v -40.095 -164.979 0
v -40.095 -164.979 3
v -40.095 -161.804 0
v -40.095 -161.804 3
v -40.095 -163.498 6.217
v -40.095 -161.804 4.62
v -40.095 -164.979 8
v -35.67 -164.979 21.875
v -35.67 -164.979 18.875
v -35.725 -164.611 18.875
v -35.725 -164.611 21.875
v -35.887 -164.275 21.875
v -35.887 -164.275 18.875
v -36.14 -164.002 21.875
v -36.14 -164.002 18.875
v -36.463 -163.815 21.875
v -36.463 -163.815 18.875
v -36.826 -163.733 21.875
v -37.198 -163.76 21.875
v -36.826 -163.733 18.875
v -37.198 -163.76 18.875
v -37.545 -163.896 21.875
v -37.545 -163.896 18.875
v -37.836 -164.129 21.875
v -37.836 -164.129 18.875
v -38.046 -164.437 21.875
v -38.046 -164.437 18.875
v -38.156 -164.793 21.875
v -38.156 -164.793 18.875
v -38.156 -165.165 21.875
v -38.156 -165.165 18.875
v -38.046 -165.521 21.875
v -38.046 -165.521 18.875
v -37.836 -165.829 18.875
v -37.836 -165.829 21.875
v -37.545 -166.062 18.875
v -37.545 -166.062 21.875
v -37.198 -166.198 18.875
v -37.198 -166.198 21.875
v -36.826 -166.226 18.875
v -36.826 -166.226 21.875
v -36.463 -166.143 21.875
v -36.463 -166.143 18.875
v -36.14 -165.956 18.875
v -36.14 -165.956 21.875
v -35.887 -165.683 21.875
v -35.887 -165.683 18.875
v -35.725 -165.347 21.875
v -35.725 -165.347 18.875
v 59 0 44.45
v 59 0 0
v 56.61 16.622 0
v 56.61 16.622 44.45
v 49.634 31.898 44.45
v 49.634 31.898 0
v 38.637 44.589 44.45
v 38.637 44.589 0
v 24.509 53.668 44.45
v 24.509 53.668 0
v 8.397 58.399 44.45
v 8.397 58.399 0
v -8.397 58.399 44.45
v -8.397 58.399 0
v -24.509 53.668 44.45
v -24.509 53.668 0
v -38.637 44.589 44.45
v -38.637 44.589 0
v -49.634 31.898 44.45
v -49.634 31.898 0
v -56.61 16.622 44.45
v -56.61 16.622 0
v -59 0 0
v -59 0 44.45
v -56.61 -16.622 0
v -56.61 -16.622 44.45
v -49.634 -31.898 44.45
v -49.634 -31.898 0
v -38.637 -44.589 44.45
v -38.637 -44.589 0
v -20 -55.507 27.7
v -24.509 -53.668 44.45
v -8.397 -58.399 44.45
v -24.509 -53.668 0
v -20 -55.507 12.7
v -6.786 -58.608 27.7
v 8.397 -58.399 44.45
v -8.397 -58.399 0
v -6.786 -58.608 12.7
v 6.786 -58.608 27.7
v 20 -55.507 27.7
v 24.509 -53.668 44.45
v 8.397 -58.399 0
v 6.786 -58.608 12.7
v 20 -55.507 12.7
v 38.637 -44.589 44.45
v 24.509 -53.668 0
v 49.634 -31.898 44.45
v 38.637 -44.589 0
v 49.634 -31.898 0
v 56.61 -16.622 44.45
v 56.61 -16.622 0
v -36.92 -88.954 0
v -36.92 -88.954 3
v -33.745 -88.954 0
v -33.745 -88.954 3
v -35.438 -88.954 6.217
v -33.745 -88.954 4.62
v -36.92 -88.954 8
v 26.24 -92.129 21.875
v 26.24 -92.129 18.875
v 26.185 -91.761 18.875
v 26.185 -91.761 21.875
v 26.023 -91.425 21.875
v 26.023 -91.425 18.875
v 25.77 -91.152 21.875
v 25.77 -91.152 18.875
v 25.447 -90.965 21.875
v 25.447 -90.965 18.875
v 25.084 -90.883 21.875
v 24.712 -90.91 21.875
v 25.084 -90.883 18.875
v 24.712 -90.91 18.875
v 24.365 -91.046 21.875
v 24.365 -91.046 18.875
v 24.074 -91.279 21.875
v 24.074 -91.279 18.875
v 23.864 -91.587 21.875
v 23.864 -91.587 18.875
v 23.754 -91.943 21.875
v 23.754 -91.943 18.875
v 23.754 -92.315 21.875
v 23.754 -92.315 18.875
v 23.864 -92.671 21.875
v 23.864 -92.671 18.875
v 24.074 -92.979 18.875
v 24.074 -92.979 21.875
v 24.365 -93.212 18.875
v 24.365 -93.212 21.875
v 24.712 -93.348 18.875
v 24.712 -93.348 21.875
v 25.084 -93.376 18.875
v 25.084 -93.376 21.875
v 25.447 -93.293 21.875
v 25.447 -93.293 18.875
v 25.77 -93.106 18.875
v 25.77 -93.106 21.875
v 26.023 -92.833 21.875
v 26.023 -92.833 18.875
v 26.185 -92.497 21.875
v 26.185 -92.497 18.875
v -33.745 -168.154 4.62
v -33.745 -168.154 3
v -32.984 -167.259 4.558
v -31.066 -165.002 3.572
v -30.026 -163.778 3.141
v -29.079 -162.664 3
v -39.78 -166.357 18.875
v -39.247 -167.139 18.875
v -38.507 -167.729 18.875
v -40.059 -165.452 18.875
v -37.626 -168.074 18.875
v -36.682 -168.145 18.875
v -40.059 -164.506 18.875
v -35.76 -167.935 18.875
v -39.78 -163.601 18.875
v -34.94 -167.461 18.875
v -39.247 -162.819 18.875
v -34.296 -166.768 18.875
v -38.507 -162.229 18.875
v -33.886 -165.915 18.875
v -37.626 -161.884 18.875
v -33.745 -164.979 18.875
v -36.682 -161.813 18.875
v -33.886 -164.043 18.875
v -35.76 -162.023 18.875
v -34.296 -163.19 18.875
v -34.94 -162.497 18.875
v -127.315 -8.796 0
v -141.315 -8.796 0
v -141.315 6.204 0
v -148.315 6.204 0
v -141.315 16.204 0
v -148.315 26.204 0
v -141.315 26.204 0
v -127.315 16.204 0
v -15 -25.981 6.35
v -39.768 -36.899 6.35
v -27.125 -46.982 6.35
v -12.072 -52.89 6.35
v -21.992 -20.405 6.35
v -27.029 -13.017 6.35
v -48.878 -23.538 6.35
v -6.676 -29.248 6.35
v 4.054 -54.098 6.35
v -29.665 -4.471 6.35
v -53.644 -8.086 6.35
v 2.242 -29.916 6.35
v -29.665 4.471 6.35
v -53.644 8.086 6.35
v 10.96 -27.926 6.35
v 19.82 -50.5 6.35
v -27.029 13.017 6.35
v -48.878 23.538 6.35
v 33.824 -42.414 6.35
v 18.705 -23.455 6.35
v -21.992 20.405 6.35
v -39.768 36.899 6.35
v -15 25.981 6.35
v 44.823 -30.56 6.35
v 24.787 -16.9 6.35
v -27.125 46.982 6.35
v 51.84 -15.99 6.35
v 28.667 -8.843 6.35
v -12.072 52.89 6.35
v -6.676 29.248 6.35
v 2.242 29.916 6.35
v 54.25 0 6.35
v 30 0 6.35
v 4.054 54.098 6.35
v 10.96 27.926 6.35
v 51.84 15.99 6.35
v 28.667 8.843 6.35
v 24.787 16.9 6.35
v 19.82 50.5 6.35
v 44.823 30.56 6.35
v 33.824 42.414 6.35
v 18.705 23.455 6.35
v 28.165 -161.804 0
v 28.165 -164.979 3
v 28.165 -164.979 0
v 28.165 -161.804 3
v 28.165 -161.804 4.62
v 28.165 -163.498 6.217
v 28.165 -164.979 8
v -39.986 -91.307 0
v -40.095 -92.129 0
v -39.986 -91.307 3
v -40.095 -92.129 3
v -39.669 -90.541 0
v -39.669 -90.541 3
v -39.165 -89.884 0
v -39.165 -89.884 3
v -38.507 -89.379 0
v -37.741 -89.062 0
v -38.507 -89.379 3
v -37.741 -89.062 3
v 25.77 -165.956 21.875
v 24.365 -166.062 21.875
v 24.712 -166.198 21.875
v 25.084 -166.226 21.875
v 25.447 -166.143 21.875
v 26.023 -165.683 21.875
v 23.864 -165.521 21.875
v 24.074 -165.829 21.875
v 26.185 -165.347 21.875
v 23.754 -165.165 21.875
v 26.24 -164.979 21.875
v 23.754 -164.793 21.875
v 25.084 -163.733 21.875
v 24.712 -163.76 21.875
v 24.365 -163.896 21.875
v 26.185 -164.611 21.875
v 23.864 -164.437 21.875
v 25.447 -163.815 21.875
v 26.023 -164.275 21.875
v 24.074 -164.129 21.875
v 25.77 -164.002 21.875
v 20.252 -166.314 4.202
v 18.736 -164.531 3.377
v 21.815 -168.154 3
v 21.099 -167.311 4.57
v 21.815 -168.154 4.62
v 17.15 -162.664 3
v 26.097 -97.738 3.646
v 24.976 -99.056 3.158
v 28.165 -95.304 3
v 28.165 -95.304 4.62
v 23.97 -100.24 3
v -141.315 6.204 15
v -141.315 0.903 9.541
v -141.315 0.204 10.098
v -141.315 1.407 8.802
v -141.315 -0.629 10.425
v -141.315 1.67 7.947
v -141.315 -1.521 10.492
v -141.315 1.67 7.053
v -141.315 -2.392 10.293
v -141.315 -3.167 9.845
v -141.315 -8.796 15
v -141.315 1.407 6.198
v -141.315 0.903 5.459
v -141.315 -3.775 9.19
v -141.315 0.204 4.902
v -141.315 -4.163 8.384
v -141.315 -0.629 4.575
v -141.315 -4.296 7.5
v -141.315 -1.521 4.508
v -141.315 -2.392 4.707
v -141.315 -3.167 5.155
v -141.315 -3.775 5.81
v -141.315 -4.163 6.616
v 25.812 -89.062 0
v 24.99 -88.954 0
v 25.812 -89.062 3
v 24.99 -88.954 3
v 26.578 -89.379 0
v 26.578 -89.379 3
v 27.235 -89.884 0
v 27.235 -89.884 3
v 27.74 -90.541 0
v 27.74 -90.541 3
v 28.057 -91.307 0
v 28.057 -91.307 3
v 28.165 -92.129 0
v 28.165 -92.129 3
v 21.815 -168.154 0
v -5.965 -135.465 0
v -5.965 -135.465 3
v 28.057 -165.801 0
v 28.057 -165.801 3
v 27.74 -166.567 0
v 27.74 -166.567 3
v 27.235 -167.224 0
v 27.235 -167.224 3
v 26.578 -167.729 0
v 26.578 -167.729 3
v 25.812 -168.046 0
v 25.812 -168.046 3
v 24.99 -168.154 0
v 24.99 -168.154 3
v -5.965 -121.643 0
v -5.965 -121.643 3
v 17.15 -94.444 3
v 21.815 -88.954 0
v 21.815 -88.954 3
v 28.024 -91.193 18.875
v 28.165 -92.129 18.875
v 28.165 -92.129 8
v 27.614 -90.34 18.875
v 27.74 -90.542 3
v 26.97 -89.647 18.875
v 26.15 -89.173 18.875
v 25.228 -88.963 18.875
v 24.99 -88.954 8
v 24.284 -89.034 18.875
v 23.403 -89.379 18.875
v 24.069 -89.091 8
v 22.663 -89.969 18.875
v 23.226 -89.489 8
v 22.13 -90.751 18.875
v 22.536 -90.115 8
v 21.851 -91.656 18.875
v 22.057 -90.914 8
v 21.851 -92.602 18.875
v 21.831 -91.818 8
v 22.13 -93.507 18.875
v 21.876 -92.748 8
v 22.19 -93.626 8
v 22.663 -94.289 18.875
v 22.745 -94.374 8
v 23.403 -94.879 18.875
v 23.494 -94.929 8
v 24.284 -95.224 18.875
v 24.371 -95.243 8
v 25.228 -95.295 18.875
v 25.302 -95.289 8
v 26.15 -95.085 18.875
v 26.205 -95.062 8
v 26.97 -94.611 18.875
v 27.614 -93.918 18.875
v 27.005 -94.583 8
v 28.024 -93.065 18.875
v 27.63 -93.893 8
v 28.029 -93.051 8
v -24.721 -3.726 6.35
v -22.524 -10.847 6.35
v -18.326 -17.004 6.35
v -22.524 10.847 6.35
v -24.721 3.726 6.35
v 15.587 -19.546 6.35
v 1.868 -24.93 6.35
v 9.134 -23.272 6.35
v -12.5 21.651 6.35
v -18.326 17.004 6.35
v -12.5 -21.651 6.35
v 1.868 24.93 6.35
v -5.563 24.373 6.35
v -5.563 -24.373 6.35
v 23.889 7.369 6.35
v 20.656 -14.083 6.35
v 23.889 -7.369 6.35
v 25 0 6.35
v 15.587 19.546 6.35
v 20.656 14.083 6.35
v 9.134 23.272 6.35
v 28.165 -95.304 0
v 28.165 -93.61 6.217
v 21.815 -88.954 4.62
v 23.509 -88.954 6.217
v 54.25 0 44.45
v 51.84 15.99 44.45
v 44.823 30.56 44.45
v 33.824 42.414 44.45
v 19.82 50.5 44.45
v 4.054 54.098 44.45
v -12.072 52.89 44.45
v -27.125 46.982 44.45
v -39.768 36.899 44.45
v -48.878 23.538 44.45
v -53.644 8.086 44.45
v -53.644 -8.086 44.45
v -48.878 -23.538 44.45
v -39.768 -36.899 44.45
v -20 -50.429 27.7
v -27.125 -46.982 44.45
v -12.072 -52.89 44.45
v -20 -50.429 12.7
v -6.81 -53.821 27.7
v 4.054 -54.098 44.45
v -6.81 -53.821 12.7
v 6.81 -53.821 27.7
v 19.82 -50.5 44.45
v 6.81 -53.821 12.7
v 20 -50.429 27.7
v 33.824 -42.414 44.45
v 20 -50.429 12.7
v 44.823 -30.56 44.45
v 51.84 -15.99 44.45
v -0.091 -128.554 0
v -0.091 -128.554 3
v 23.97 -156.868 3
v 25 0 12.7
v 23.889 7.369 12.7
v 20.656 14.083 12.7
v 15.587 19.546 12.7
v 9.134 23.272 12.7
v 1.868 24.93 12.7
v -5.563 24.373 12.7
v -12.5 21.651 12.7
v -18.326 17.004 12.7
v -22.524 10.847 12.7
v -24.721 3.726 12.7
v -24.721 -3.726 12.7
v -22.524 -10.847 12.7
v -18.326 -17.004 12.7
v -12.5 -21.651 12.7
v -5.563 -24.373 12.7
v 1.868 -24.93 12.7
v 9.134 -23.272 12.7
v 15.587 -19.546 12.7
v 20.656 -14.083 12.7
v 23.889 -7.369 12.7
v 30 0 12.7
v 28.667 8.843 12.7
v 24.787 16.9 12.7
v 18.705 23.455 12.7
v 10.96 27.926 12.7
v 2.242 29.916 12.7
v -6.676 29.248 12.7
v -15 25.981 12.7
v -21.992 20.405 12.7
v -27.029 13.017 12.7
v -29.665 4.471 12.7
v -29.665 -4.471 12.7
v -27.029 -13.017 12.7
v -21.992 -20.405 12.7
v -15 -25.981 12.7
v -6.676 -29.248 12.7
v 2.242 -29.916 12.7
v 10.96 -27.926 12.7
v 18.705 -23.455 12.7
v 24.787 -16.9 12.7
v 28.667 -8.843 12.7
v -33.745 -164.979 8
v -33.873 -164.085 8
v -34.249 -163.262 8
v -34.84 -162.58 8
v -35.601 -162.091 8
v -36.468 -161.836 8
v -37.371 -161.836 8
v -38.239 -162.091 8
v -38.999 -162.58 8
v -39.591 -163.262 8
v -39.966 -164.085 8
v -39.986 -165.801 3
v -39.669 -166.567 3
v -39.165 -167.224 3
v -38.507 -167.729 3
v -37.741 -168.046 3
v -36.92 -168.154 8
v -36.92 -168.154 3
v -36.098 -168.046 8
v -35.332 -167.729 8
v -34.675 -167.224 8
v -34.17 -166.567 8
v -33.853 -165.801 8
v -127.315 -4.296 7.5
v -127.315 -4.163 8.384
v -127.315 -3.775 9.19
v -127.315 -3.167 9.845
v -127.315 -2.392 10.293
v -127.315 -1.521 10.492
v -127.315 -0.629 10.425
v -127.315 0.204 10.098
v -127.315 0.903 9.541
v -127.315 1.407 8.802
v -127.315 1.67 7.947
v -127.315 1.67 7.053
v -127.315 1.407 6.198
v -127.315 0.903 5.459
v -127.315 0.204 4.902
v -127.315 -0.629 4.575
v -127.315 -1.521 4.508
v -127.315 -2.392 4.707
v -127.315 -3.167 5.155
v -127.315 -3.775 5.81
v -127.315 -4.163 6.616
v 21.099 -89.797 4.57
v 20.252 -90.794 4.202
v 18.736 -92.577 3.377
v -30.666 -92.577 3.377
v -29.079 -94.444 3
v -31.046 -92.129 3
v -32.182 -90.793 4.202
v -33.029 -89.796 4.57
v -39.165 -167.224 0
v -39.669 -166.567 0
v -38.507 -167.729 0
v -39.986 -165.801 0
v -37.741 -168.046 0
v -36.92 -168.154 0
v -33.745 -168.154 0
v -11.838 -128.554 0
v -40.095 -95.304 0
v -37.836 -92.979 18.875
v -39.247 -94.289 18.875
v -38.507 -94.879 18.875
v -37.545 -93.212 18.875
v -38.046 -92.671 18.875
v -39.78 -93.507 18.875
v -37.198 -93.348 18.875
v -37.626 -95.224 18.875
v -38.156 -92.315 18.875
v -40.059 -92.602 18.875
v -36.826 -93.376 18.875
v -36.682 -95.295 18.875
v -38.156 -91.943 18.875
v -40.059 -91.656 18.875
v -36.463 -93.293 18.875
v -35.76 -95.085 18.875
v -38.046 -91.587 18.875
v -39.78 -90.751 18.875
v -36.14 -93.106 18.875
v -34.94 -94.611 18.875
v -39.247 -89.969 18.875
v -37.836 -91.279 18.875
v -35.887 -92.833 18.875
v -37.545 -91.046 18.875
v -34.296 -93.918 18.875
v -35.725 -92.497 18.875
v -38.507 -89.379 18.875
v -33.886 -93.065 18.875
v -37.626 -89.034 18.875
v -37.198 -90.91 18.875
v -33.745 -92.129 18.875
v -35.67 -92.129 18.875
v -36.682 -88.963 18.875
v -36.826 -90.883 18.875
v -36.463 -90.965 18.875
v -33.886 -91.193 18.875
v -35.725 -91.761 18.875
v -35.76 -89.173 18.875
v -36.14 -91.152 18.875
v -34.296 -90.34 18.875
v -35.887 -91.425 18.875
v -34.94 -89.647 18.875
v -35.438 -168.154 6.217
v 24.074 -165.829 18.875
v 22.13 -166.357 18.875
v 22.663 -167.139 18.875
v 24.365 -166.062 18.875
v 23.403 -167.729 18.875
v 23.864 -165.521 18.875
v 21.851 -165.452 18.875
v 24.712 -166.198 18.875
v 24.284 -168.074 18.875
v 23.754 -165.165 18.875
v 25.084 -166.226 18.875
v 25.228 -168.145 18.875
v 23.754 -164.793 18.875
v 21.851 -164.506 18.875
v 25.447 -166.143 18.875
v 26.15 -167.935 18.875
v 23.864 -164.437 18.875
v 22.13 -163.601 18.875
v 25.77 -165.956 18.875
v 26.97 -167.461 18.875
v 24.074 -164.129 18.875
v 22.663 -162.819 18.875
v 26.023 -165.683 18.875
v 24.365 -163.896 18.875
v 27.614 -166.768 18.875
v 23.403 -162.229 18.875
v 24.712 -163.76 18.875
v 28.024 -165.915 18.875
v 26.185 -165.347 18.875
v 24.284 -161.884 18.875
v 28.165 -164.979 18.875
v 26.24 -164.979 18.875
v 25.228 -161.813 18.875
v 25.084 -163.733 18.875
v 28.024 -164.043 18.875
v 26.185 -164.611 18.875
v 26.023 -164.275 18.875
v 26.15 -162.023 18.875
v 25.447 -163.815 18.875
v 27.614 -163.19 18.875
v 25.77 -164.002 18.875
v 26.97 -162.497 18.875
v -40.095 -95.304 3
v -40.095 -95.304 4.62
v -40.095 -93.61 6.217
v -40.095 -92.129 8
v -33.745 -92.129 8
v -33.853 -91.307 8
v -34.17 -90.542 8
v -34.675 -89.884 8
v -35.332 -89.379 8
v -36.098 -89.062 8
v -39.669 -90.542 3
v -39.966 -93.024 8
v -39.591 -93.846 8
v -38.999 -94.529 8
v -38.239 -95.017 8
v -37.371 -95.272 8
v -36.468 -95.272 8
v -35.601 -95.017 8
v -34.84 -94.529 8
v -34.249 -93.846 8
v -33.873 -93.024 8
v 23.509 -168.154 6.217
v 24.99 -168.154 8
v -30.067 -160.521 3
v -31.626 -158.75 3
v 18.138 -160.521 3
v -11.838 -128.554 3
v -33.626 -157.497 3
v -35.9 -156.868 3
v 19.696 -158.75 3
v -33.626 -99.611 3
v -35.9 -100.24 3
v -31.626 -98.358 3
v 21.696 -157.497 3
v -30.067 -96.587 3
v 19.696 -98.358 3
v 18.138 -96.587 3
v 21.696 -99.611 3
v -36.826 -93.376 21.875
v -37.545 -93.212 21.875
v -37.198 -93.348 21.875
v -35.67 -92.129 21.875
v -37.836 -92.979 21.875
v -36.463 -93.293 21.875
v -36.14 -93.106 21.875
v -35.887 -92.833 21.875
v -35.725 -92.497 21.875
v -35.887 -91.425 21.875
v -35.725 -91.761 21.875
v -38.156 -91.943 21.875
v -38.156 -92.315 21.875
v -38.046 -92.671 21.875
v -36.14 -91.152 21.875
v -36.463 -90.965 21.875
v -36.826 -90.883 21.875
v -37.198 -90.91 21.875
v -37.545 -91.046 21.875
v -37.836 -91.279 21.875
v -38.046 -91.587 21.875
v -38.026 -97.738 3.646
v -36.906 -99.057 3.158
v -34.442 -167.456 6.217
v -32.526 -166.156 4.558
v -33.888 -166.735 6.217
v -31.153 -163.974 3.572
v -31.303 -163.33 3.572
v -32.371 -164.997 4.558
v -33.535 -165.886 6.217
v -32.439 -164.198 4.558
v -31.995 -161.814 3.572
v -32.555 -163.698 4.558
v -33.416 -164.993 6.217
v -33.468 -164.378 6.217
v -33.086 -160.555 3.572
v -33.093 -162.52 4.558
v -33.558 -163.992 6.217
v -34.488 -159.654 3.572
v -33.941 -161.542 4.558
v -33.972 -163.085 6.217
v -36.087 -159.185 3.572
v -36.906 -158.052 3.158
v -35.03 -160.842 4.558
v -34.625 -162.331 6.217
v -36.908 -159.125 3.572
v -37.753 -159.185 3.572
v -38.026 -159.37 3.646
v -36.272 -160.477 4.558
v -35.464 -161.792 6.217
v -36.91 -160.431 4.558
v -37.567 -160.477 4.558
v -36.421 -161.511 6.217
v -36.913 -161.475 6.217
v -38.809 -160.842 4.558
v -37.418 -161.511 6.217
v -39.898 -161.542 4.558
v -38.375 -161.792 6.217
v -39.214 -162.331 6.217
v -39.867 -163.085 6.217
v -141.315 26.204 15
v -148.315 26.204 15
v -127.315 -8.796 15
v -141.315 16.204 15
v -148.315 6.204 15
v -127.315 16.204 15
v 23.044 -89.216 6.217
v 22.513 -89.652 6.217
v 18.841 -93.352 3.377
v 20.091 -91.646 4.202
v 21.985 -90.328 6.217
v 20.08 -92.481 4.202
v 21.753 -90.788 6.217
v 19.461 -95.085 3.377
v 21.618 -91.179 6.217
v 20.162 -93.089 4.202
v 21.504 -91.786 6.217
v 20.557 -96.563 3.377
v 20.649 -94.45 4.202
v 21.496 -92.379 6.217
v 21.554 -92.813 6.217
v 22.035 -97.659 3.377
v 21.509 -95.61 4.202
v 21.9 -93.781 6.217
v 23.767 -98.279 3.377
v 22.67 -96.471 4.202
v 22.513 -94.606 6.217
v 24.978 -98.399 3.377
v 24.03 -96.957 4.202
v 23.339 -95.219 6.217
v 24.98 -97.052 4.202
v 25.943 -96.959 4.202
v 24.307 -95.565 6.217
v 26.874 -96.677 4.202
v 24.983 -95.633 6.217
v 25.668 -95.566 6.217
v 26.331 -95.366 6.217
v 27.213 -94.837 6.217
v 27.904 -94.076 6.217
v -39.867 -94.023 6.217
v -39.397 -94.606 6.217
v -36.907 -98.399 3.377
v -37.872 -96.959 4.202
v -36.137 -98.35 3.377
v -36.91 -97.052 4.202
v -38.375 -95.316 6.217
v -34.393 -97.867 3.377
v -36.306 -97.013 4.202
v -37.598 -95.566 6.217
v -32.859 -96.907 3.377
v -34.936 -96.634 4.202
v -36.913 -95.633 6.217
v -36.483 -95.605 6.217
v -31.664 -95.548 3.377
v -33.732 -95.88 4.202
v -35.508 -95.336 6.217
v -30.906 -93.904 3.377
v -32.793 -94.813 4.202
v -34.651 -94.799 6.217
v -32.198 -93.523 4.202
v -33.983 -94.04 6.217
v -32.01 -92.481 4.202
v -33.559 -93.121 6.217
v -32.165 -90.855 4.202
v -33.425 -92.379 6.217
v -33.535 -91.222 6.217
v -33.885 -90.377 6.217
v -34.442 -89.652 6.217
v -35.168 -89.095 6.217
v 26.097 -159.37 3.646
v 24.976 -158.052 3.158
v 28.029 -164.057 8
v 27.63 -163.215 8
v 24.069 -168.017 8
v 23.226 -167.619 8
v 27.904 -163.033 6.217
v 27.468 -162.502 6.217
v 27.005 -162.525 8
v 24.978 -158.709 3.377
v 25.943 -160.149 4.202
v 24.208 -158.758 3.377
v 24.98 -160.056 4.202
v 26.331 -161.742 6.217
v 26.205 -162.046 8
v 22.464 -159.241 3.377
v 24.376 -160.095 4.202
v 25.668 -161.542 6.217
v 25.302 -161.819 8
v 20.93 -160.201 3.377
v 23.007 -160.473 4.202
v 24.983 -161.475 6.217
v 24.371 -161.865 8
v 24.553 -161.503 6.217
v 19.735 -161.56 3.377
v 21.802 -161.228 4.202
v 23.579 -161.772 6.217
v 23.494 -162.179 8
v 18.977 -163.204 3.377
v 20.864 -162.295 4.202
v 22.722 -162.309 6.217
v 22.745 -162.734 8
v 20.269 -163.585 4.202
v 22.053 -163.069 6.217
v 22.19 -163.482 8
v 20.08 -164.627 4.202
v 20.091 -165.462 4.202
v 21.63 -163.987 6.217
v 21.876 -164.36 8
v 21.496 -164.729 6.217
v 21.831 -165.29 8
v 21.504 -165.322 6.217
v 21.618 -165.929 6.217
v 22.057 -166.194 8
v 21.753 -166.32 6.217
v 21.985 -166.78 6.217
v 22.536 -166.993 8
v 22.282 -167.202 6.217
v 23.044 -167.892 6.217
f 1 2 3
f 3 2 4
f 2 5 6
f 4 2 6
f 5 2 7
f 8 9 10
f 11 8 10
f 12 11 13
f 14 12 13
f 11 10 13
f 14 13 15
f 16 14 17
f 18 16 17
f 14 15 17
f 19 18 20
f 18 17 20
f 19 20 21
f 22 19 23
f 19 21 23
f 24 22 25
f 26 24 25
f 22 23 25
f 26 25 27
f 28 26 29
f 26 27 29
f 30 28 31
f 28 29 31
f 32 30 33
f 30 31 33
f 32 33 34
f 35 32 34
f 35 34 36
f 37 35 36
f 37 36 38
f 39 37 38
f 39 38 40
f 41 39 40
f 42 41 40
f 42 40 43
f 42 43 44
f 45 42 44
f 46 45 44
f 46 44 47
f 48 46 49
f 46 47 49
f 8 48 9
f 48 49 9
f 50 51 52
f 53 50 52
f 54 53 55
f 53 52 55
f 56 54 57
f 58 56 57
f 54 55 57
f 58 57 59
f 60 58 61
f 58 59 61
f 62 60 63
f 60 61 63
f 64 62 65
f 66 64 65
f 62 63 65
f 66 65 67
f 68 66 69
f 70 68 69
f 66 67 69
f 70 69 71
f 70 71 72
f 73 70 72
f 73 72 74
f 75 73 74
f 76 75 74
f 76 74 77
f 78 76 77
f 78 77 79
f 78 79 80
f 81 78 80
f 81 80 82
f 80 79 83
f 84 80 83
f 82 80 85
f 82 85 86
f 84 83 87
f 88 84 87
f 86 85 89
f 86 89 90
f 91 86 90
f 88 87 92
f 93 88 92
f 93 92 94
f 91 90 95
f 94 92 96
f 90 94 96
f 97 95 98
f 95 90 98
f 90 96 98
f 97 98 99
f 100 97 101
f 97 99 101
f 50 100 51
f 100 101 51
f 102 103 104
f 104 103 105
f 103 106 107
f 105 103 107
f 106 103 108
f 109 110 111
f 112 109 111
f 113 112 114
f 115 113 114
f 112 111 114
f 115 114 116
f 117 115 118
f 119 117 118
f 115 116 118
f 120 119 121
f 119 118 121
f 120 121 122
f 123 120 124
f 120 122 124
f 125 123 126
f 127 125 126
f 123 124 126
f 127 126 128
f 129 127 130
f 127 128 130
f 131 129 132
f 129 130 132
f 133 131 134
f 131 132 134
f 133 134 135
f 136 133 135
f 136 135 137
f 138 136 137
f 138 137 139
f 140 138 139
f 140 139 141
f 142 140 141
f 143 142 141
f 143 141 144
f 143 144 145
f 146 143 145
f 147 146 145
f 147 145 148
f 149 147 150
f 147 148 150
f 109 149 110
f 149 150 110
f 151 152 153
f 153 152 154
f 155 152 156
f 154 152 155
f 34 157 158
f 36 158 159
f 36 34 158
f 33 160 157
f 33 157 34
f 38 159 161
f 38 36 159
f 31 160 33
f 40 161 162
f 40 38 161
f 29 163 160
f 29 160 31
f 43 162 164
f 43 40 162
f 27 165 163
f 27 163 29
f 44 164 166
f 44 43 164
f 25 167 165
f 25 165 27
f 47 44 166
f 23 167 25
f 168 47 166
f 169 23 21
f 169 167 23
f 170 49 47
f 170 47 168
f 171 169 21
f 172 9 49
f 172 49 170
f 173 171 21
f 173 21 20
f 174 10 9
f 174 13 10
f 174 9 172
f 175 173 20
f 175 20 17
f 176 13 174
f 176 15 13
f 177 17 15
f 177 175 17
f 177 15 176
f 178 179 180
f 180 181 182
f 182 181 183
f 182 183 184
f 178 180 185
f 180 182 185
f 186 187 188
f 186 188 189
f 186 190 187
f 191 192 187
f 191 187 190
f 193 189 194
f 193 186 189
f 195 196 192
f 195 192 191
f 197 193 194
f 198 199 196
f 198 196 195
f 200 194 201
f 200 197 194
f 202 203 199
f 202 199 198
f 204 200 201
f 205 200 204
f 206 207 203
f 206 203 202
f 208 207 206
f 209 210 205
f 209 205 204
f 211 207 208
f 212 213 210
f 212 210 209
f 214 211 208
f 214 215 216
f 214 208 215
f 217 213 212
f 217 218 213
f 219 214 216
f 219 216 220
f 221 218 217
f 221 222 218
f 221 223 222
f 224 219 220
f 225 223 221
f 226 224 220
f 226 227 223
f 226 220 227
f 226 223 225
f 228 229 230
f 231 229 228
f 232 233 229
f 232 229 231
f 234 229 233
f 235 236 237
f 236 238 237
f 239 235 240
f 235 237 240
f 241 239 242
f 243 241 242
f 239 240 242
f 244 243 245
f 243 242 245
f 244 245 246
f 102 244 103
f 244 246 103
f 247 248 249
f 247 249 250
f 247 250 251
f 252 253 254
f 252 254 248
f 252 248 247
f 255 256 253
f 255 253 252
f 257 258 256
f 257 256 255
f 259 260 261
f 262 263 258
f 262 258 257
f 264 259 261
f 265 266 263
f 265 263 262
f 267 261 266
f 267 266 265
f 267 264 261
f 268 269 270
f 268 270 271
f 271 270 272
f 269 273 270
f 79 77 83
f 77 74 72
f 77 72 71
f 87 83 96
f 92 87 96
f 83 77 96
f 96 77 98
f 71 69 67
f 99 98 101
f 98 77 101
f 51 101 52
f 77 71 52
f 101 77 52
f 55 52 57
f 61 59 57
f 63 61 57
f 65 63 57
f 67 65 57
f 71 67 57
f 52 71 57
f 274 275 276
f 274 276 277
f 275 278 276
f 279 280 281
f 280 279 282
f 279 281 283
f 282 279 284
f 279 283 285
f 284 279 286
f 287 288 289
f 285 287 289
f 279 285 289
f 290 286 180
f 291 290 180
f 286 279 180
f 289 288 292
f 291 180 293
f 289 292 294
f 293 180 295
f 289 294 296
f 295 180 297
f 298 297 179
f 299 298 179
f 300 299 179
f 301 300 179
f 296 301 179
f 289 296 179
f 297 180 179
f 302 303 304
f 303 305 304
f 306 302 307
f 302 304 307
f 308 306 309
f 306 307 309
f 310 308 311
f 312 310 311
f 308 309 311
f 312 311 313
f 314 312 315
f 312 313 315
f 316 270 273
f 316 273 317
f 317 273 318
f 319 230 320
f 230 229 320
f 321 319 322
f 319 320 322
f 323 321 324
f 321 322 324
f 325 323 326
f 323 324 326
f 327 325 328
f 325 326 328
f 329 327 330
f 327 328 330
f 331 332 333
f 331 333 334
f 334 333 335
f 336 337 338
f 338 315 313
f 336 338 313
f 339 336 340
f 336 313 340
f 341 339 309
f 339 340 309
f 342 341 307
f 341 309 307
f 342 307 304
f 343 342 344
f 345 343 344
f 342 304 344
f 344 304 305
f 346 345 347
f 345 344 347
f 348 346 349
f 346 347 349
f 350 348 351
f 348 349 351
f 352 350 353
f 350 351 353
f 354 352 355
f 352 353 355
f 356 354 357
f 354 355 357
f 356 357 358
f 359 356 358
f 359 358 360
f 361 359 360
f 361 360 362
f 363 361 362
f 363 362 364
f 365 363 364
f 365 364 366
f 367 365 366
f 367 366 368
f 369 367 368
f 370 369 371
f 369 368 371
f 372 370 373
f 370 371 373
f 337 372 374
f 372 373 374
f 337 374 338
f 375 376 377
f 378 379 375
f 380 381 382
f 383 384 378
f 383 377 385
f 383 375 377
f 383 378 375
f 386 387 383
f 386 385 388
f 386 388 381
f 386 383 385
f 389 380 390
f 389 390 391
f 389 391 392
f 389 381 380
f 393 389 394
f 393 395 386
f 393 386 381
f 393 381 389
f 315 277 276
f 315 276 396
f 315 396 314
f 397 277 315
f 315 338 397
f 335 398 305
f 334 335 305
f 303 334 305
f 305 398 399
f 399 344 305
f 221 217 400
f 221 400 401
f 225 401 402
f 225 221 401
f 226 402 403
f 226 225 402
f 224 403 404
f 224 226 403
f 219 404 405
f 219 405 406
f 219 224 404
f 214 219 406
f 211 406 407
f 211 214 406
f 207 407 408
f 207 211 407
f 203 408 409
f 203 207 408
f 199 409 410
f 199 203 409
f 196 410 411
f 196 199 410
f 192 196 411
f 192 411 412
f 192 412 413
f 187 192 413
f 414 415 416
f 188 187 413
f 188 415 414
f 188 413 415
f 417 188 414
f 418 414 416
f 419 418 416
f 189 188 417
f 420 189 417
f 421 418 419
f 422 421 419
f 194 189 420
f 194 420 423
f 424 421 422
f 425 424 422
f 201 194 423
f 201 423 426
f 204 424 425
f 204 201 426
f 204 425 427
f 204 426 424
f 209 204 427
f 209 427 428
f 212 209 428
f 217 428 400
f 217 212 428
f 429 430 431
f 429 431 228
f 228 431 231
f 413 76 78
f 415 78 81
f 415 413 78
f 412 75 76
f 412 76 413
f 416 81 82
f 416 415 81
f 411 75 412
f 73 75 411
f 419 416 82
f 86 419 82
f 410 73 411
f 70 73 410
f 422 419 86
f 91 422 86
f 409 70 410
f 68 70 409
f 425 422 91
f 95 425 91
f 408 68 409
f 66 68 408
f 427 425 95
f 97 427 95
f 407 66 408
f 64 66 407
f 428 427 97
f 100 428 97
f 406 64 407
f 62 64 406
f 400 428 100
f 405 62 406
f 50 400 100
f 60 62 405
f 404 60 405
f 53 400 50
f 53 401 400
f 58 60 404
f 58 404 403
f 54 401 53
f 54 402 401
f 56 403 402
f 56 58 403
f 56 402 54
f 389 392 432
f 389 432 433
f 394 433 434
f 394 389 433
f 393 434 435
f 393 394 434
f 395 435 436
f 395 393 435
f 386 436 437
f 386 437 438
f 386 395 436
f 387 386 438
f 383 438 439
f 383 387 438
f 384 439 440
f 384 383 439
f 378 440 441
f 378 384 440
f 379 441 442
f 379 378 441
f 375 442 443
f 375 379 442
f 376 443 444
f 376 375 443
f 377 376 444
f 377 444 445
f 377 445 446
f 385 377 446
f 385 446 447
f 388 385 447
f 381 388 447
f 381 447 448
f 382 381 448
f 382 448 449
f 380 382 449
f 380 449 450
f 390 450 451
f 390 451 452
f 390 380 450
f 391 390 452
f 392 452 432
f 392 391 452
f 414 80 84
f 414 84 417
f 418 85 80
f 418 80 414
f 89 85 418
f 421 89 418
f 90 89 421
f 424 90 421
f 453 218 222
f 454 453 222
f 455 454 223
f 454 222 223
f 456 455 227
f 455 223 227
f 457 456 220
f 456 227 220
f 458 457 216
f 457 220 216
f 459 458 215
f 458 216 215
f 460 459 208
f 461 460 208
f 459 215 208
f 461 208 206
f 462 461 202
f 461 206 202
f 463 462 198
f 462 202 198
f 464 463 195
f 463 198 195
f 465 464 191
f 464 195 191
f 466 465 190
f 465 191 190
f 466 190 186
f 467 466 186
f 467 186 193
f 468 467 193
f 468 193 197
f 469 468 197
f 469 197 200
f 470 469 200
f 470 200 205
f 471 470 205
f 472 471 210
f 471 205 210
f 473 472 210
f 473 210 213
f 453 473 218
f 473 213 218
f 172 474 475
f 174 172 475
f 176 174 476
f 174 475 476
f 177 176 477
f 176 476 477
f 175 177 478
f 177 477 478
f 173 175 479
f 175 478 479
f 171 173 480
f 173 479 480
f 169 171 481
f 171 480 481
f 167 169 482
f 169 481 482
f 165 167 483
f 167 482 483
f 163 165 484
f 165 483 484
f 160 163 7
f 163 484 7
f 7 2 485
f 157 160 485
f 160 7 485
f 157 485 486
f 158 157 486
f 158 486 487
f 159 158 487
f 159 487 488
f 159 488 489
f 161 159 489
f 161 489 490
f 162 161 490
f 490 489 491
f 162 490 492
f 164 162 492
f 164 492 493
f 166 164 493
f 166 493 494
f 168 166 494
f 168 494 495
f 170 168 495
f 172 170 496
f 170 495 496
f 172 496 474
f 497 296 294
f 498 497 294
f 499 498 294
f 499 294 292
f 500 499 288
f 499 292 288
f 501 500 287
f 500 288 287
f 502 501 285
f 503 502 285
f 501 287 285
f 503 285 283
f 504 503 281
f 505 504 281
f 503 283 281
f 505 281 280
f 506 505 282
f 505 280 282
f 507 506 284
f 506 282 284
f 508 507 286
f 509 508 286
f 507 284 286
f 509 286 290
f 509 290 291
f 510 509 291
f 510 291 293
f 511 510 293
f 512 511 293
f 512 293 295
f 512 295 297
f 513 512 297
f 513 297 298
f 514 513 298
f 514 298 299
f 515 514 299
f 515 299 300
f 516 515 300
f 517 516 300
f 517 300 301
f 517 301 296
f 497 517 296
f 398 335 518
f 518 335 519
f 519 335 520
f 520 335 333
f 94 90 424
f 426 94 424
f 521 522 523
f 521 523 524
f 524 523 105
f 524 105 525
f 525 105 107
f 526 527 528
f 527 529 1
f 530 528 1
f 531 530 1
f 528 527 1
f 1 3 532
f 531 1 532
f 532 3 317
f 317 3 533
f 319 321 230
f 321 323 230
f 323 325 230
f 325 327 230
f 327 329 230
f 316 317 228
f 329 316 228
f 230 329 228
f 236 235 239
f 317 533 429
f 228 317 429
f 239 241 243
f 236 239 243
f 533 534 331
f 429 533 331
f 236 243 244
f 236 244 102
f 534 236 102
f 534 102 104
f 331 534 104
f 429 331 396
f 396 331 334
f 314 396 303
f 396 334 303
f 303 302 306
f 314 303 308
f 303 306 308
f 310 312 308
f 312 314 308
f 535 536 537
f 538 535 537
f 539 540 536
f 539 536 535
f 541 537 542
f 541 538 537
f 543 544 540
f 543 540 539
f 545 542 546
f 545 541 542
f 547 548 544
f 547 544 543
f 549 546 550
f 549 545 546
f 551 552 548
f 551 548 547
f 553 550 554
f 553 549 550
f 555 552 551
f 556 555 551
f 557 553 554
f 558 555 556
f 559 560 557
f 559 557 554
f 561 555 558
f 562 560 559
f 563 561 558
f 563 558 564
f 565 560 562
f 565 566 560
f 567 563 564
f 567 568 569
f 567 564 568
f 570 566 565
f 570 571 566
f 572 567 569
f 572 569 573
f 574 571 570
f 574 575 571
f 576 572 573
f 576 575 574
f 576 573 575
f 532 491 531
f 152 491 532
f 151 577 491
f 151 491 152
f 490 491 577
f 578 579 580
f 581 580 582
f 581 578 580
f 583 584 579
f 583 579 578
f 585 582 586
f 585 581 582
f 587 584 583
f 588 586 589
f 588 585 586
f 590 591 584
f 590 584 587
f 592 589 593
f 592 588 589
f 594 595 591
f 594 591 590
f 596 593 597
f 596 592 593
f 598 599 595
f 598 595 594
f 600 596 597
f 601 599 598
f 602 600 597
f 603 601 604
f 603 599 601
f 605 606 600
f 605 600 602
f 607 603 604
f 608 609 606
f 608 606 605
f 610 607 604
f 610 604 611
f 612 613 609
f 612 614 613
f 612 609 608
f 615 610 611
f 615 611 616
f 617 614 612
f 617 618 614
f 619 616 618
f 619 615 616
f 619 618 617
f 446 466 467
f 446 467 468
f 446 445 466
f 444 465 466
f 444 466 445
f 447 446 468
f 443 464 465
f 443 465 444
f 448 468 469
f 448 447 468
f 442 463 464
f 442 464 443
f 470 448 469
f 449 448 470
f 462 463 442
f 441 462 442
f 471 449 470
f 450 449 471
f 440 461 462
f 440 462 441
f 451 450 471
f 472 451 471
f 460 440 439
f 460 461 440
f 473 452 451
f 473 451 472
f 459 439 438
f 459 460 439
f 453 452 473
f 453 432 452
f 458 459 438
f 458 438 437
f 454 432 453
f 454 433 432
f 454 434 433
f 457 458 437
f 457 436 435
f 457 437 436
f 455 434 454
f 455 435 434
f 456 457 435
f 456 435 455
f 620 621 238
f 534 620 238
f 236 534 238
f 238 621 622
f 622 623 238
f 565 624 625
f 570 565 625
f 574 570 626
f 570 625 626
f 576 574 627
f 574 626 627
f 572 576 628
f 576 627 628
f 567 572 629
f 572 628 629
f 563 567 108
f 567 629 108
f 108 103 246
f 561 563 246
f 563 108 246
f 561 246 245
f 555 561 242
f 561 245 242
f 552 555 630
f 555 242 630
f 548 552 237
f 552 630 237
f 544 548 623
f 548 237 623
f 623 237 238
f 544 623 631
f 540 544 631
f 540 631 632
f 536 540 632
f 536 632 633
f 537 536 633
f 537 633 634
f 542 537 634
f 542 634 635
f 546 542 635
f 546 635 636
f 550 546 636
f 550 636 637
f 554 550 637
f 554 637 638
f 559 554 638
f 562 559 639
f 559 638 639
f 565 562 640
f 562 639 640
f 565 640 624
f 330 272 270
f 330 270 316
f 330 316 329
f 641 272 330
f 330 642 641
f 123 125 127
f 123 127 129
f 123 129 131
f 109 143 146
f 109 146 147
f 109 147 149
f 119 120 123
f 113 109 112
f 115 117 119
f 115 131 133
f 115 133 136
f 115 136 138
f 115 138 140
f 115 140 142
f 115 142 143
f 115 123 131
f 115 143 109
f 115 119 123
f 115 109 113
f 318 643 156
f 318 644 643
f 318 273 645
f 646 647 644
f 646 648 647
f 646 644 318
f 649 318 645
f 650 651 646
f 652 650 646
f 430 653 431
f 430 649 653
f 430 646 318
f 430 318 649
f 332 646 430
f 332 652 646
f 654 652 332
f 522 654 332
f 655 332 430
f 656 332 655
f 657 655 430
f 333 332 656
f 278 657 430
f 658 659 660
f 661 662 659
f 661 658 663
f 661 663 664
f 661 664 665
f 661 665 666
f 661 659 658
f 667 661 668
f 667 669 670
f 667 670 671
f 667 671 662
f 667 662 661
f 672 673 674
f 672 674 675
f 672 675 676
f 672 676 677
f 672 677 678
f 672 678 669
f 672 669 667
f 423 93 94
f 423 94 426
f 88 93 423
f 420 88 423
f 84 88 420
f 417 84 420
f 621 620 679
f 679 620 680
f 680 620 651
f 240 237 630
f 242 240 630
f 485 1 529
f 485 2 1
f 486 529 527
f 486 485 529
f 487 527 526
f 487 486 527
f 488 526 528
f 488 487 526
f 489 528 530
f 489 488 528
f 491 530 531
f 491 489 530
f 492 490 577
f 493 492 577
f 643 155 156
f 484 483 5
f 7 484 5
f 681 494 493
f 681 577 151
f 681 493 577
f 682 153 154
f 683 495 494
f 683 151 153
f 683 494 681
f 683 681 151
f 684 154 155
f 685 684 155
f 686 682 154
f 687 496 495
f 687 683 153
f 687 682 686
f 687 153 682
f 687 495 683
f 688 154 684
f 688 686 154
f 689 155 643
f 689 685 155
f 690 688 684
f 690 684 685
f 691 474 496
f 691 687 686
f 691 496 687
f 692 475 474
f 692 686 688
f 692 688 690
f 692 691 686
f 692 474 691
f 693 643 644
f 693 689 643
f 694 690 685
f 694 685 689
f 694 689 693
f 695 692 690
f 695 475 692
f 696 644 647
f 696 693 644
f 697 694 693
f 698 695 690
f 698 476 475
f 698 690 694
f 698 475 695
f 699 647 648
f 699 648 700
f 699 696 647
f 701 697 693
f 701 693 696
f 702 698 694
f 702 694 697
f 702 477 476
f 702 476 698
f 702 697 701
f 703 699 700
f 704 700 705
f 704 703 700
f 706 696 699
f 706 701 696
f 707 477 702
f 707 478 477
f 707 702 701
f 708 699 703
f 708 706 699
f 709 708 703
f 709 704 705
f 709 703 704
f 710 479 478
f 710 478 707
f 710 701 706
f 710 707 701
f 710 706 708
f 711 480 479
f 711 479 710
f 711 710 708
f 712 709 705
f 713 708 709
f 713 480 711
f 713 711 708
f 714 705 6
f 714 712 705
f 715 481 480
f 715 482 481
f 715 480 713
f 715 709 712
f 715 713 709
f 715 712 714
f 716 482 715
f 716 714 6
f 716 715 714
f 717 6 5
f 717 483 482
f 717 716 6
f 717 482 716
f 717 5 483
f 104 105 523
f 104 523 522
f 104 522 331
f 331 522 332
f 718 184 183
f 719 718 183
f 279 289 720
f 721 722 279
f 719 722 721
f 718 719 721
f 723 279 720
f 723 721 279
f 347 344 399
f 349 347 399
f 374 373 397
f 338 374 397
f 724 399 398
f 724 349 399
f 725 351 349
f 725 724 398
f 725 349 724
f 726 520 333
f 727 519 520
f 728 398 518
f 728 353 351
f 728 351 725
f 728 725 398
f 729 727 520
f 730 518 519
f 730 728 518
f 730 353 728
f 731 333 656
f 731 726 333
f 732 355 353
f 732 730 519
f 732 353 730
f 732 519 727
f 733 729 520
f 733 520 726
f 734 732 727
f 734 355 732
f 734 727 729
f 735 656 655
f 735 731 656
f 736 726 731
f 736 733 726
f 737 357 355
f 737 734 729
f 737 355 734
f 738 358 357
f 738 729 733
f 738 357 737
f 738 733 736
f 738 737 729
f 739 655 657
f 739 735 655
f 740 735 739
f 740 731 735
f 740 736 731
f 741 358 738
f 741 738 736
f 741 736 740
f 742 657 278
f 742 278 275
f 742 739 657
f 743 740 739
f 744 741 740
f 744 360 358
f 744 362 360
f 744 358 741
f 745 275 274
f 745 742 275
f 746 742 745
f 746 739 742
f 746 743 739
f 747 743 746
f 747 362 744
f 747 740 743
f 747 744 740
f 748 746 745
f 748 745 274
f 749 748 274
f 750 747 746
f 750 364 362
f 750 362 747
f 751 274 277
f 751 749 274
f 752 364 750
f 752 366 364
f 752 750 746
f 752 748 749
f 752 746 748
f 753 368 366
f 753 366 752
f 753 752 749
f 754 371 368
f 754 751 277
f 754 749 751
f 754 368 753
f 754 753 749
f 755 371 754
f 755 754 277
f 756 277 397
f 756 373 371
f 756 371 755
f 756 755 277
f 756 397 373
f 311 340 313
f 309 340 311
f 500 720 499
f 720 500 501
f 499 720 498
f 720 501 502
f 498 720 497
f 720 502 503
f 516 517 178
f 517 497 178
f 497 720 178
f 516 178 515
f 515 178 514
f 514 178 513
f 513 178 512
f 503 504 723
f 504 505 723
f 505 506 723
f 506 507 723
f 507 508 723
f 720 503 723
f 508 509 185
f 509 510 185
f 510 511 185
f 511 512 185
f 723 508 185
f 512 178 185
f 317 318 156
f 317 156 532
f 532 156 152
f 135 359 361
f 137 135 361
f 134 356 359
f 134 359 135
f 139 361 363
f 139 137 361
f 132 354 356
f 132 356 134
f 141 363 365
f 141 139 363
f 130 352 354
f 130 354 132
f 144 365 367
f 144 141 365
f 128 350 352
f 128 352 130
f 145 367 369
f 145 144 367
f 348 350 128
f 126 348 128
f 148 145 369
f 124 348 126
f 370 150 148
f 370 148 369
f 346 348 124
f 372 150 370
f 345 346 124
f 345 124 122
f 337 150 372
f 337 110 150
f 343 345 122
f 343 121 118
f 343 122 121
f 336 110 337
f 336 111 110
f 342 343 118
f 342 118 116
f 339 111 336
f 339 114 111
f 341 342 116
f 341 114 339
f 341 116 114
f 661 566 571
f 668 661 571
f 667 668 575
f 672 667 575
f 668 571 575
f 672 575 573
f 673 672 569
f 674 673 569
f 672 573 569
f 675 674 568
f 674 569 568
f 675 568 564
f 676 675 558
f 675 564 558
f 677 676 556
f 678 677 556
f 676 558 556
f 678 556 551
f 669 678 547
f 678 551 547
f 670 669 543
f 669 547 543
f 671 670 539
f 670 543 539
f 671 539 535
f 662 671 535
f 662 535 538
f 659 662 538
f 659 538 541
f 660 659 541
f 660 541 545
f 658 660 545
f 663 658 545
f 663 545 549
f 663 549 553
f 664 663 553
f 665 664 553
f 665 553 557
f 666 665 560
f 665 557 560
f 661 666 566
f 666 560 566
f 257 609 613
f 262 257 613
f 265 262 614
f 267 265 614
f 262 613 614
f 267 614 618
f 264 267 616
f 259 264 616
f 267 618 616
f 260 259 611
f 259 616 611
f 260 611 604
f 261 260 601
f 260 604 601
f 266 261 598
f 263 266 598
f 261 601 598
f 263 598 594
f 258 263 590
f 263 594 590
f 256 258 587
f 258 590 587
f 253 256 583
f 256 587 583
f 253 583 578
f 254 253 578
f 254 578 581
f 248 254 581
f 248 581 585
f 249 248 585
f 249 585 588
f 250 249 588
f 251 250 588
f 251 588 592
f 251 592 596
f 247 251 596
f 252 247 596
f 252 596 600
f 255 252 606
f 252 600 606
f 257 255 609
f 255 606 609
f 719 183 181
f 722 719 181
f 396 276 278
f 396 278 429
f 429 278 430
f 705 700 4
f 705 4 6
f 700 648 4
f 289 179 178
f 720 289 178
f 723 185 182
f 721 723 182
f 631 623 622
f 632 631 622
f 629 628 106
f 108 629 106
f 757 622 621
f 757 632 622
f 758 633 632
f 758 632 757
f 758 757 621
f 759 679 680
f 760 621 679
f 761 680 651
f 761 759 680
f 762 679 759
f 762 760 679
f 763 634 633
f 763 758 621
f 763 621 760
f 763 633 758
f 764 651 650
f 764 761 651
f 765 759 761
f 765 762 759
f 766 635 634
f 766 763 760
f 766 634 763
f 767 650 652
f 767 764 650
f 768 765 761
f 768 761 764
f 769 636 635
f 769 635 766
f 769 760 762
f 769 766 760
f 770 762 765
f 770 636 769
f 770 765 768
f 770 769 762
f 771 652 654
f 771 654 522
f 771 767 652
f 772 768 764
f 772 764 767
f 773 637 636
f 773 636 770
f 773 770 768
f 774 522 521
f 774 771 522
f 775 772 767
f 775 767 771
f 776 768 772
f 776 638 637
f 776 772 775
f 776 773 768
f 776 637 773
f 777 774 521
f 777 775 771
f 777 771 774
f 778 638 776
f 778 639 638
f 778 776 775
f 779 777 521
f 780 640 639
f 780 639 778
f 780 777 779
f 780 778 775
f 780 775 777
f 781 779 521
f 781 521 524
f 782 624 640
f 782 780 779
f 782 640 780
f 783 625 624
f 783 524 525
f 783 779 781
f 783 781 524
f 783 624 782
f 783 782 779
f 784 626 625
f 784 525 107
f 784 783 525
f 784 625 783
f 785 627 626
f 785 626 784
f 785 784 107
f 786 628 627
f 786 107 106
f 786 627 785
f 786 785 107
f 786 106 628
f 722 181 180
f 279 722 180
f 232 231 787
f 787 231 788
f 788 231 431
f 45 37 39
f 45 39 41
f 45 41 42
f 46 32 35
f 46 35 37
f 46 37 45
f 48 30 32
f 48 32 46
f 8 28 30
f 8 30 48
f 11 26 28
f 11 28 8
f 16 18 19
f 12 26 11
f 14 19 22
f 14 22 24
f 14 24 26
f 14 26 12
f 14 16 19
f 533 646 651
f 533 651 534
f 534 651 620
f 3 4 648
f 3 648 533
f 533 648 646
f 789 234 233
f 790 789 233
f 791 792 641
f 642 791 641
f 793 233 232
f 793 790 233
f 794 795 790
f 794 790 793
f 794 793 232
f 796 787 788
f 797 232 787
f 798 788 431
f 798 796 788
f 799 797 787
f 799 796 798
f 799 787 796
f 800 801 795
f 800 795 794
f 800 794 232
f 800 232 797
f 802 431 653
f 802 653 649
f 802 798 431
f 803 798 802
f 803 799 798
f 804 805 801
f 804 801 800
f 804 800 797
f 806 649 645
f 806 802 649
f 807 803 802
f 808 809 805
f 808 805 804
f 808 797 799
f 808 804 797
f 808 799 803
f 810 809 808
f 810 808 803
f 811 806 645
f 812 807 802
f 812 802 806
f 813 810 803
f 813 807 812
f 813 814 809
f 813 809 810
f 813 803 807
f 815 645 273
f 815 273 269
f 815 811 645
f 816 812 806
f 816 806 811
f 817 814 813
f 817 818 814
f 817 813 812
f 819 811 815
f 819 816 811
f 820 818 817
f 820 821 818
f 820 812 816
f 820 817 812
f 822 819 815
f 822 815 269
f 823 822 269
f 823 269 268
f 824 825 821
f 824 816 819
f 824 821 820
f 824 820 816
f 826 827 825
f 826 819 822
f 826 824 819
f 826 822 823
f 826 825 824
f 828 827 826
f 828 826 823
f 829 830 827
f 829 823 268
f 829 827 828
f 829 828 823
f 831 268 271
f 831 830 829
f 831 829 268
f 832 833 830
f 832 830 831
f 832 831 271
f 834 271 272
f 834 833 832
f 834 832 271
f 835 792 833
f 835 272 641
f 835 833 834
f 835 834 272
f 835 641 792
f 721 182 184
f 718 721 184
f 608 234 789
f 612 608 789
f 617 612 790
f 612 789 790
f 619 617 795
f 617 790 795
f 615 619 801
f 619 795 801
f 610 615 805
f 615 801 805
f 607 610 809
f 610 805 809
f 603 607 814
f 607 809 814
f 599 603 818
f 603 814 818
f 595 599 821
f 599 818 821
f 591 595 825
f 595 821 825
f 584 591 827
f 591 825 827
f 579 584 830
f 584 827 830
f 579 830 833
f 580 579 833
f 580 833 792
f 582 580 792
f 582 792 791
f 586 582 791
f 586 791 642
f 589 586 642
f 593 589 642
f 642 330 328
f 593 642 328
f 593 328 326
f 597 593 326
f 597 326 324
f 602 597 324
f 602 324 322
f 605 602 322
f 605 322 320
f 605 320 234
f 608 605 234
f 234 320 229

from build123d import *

# Parameters (mm, degrees)
F0_R          = 59
F1_DEPTH      = 6.35
F2_R          = 59
F2_R_2        = 54.25
F3_DEPTH      = 38.1
F4_R          = 30
F4_R_2        = 25
F5_DEPTH      = 6.35
F6_W          = 17.5801962614
F6_H          = 15
F7_DEPTH      = 20
F7_DEPTH_BACK = 20
F8_W          = 68.26
F8_H          = 79.2
F9_DEPTH      = 3
F11_DEPTH     = 25
F12_R         = 3.175
F13_DEPTH     = 15.875
F14_R         = 3.1749
F15_R         = 1.25
F16_DEPTH     = 3
F17_T4_ANGLE  = 270.0000007364
F17_T12_ANGLE = 90
F17_T18_ANGLE = 180
F17_T25_ANGLE = 270
F17_T33_ANGLE = 180
F17_T40_ANGLE = 90
F19_DEPTH     = 15
F20_R         = 3
F21_DEPTH     = 25


# Not quite as in the source:
# - a fillet or chamfer that OpenCascade refuses, or shapes differently, is made with other operations: its cross-section is extruded or revolved along the edge and cut away or added
# - a fillet or chamfer is up to 0.001 mm smaller than in the source, because OpenCascade refuses the exact size


with BuildPart() as f1:
    # F0 (on Top) → F1 (new body)
    with BuildSketch(Plane.XY):
        Circle(F0_R)
    extrude(amount=F1_DEPTH)

    # F2 (on face) → F3 (join)
    with BuildSketch(Plane.XY.offset(6.35)):
        Circle(F2_R)
        Circle(F2_R_2, mode=Mode.SUBTRACT)
    extrude(amount=F3_DEPTH)

    # F4 (on face) → F5 (join)
    with BuildSketch(Plane.XY.offset(6.35)):
        Circle(F4_R)
        Circle(F4_R_2, mode=Mode.SUBTRACT)
    extrude(amount=F5_DEPTH)

    # F6 (on Right) → F7 (cut, two sides)
    with BuildSketch(Plane.YZ) as f7_sk:
        with Locations((-53.9534389973, 20.2)):
            Rectangle(F6_W, F6_H)
    extrude(amount=F7_DEPTH, mode=Mode.SUBTRACT)
    extrude(f7_sk.sketch, amount=-F7_DEPTH_BACK, mode=Mode.SUBTRACT)


with BuildPart() as f9:
    # F8 (on Top) → F9 (new body)
    with BuildSketch(Plane.XY):
        with Locations((-5.9646429376, -128.5540193915)):
            Rectangle(F8_W, F8_H)
    extrude(amount=F9_DEPTH)

    # F10 (on face) → F11 (cut)
    with BuildSketch(Plane.XY.offset(3)):
        Polygon((-0.0914377214, -128.5540193915), (28.1653570624, -161.8040193915), (28.1653570624, -95.3040193915), align=None)
        Polygon((-33.7446429376, -88.9540193915), (-5.9646429376, -121.6429710956), (21.8153570624, -88.9540193915), align=None)
        Polygon((-33.7446429376, -168.1540193915), (21.8153570624, -168.1540193915), (-5.9646429376, -135.4650676875), align=None)
        Polygon((-40.0946429376, -161.8040193915), (-11.8378481538, -128.5540193915), (-40.0946429376, -95.3040193915), align=None)
    extrude(amount=-F11_DEPTH, mode=Mode.SUBTRACT)

    # F12 (on face) → F13 (join)
    with BuildSketch(Plane.XY.offset(3)):
        with Locations((-36.9196429376, -92.1290193915)):
            Circle(F12_R)
        with Locations((24.9903570624, -92.1290193915)):
            Circle(F12_R)
        with Locations((24.9903570624, -164.9790193915)):
            Circle(F12_R)
        with Locations((-36.9196429376, -164.9790193915)):
            Circle(F12_R)
    extrude(amount=F13_DEPTH)

    # F14 (radius 3.175 in the source; OpenCascade refuses exactly that, so slightly less here)
    f14_edges = [f9.edges().sort_by_distance(p)[0] for p in [
        (-40.094643, -168.154019, 1.5),
        (28.165357, -168.154019, 1.5),
        (28.165357, -88.954019, 1.5),
        (-40.094643, -88.954019, 1.5),
    ]]
    fillet(f14_edges, radius=F14_R)

    # F15 (on face) → F16 (join)
    with BuildSketch(Plane.XY.offset(18.875)):
        with Locations((24.9903570624, -164.9790193915)):
            Circle(F15_R)
        with Locations((24.9903570624, -92.1290193915)):
            Circle(F15_R)
        with Locations((-36.9196429376, -92.1290193915)):
            Circle(F15_R)
        with Locations((-36.9196429376, -164.9790193915)):
            Circle(F15_R)
    extrude(amount=F16_DEPTH)

    # F17: fillet of radius 5 on 6 edges, made by hand


with BuildPart() as f17_tool2:
    # F17_s3 → F17_t4 (revolve)
    with BuildSketch(Plane.XZ.offset(164.9790193915)):
        with BuildLine():
            ThreePointArc((33.1653570624, 3), (29.6298231565, 4.4644660941), (28.1653570624, 8))
            Line((28.1653570624, 8), (28.1653570624, 3))
            Line((28.1653570624, 3), (33.1653570624, 3))
        make_face()
    revolve(axis=Axis((24.9903570624, -164.9790193915, 3), (0, 0, 1)), revolution_arc=F17_T4_ANGLE)

    split(bisect_by=Plane(origin=(-70.308977279, -59.7505666897, 0), x_dir=(0, 0, 1), z_dir=(0.7620038344, 0.6475725105, 0)), keep=Keep.TOP)

    split(bisect_by=Plane.XZ.offset(168.1540193915), keep=Keep.BOTTOM)

    split(bisect_by=Plane.YZ.offset(28.1653570624), keep=Keep.BOTTOM)

    split(bisect_by=Plane(origin=(-63.4884258978, -53.954268323, 0), x_dir=(0, 0, 1), z_dir=(-0.7620038344, -0.6475725105, 0)), keep=Keep.TOP)


with BuildPart() as f9_1:
    add(f9.part)

    # F17_t1: union F17_tool2
    add(f17_tool2.part)


with BuildPart() as f17_tool10:
    # F17_s11 → F17_t12 (revolve)
    with BuildSketch(Plane.YZ.offset(-36.9196429376)):
        with BuildLine():
            ThreePointArc((-173.1540193915, 3), (-169.6184854856, 4.4644660941), (-168.1540193915, 8))
            Line((-168.1540193915, 8), (-168.1540193915, 3))
            Line((-168.1540193915, 3), (-173.1540193915, 3))
        make_face()
    revolve(axis=Axis((-36.9196429376, -164.9790193915, 3), (0, 0, 1)), revolution_arc=F17_T12_ANGLE)

    split(bisect_by=Plane.XZ.offset(168.1540193915), keep=Keep.BOTTOM)

    split(bisect_by=Plane(origin=(63.3822393005, -53.8640279354, 0), x_dir=(0, 0, 1), z_dir=(-0.7620038344, 0.6475725105, 0)), keep=Keep.TOP)


with BuildPart() as f9_2:
    add(f9_1.part)

    # F17_t9: union F17_tool10
    add(f17_tool10.part)


with BuildPart() as f17_tool16:
    # F17_s17 → F17_t18 (revolve)
    with BuildSketch(Plane.XZ.offset(164.9790193915)):
        with BuildLine():
            ThreePointArc((-28.7446429376, 3), (-32.2801768435, 4.4644660941), (-33.7446429376, 8))
            Line((-33.7446429376, 8), (-33.7446429376, 3))
            Line((-33.7446429376, 3), (-28.7446429376, 3))
        make_face()
    revolve(axis=Axis((-36.9196429376, -164.9790193915, 3), (0, 0, 1)), revolution_arc=F17_T18_ANGLE)

    split(bisect_by=Plane(origin=(63.3822393005, -53.8640279354, 0), x_dir=(0, 0, 1), z_dir=(-0.7620038344, 0.6475725105, 0)), keep=Keep.TOP)

    split(bisect_by=Plane.YZ.offset(-40.0946429376), keep=Keep.TOP)

    split(bisect_by=Plane(origin=(56.5616879193, -48.0677295688, 0), x_dir=(0, 0, 1), z_dir=(0.7620038344, -0.6475725105, 0)), keep=Keep.TOP)


with BuildPart() as f9_3:
    add(f9_2.part)

    # F17_t15: union F17_tool16
    add(f17_tool16.part)


with BuildPart() as f17_tool23:
    # F17_s24 → F17_t25 (revolve)
    with BuildSketch(Plane.YZ.offset(24.9903570624)):
        with BuildLine():
            ThreePointArc((-83.9540193915, 3), (-87.4895532975, 4.4644660941), (-88.9540193915, 8))
            Line((-88.9540193915, 8), (-88.9540193915, 3))
            Line((-88.9540193915, 3), (-83.9540193915, 3))
        make_face()
    revolve(axis=Axis((24.9903570624, -92.1290193915, 3), (0, 0, 1)), revolution_arc=F17_T25_ANGLE)

    split(bisect_by=Plane(origin=(56.5616879193, -48.0677295688, 0), x_dir=(0, 0, 1), z_dir=(0.7620038344, -0.6475725105, 0)), keep=Keep.TOP)

    split(bisect_by=Plane.XZ.offset(88.9540193915), keep=Keep.TOP)

    split(bisect_by=Plane(origin=(63.3822393005, -53.8640279354, 0), x_dir=(0, 0, 1), z_dir=(-0.7620038344, 0.6475725105, 0)), keep=Keep.TOP)

    split(bisect_by=Plane.YZ.offset(28.1653570624), keep=Keep.BOTTOM)


with BuildPart() as f9_4:
    add(f9_3.part)

    # F17_t22: union F17_tool23
    add(f17_tool23.part)


with BuildPart() as f17_tool31:
    # F17_s32 → F17_t33 (revolve)
    with BuildSketch(Plane.XZ.offset(92.1290193915)):
        with BuildLine():
            ThreePointArc((-45.0946429376, 3), (-41.5591090317, 4.4644660941), (-40.0946429376, 8))
            Line((-40.0946429376, 8), (-40.0946429376, 3))
            Line((-40.0946429376, 3), (-45.0946429376, 3))
        make_face()
    revolve(axis=Axis((-36.9196429376, -92.1290193915, 3), (0, 0, 1)), revolution_arc=F17_T33_ANGLE)

    split(bisect_by=Plane(origin=(-70.308977279, -59.7505666897, 0), x_dir=(0, 0, 1), z_dir=(0.7620038344, 0.6475725105, 0)), keep=Keep.TOP)

    split(bisect_by=Plane.YZ.offset(-40.0946429376), keep=Keep.TOP)

    split(bisect_by=Plane(origin=(-63.4884258978, -53.954268323, 0), x_dir=(0, 0, 1), z_dir=(-0.7620038344, -0.6475725105, 0)), keep=Keep.TOP)


with BuildPart() as f9_5:
    add(f9_4.part)

    # F17_t30: union F17_tool31
    add(f17_tool31.part)


with BuildPart() as f17_tool38:
    # F17_s39 → F17_t40 (revolve)
    with BuildSketch(Plane.XZ.offset(92.1290193915)):
        with BuildLine():
            ThreePointArc((-28.7446429376, 3), (-32.2801768435, 4.4644660941), (-33.7446429376, 8))
            Line((-33.7446429376, 8), (-33.7446429376, 3))
            Line((-33.7446429376, 3), (-28.7446429376, 3))
        make_face()
    revolve(axis=Axis((-36.9196429376, -92.1290193915, 3), (0, 0, 1)), revolution_arc=F17_T40_ANGLE)

    split(bisect_by=Plane.XZ.offset(88.9540193915), keep=Keep.TOP)

    split(bisect_by=Plane(origin=(-63.4884258978, -53.954268323, 0), x_dir=(0, 0, 1), z_dir=(-0.7620038344, -0.6475725105, 0)), keep=Keep.TOP)


with BuildPart() as f9_6:
    add(f9_5.part)

    # F17_t37: union F17_tool38
    add(f17_tool38.part)


with BuildPart() as f19:
    # F18 (on Top) → F19 (new body)
    with BuildSketch(Plane.XY):
        Polygon((-141.315436988, 26.2035948246), (-148.315436988, 26.2035948246), (-148.315436988, 6.2035948246), (-141.315436988, 6.2035948246), (-141.315436988, 16.2035948246), align=None)
        Polygon((-127.315436988, 16.2035948246), (-141.315436988, 16.2035948246), (-141.315436988, 6.2035948246), (-141.315436988, -8.7964051754), (-127.315436988, -8.7964051754), align=None)
    extrude(amount=F19_DEPTH)

    # F20 (on face) → F21 (cut)
    with BuildSketch(Plane(origin=(-141.315436988, 0, 0), x_dir=(0, -1, 0), z_dir=(-1, 0, 0))):
        with Locations((1.2964051754, 7.5)):
            Circle(F20_R)
    extrude(amount=-F21_DEPTH, mode=Mode.SUBTRACT)


solid = Compound([f1.part, f9_6.part, f19.part])
